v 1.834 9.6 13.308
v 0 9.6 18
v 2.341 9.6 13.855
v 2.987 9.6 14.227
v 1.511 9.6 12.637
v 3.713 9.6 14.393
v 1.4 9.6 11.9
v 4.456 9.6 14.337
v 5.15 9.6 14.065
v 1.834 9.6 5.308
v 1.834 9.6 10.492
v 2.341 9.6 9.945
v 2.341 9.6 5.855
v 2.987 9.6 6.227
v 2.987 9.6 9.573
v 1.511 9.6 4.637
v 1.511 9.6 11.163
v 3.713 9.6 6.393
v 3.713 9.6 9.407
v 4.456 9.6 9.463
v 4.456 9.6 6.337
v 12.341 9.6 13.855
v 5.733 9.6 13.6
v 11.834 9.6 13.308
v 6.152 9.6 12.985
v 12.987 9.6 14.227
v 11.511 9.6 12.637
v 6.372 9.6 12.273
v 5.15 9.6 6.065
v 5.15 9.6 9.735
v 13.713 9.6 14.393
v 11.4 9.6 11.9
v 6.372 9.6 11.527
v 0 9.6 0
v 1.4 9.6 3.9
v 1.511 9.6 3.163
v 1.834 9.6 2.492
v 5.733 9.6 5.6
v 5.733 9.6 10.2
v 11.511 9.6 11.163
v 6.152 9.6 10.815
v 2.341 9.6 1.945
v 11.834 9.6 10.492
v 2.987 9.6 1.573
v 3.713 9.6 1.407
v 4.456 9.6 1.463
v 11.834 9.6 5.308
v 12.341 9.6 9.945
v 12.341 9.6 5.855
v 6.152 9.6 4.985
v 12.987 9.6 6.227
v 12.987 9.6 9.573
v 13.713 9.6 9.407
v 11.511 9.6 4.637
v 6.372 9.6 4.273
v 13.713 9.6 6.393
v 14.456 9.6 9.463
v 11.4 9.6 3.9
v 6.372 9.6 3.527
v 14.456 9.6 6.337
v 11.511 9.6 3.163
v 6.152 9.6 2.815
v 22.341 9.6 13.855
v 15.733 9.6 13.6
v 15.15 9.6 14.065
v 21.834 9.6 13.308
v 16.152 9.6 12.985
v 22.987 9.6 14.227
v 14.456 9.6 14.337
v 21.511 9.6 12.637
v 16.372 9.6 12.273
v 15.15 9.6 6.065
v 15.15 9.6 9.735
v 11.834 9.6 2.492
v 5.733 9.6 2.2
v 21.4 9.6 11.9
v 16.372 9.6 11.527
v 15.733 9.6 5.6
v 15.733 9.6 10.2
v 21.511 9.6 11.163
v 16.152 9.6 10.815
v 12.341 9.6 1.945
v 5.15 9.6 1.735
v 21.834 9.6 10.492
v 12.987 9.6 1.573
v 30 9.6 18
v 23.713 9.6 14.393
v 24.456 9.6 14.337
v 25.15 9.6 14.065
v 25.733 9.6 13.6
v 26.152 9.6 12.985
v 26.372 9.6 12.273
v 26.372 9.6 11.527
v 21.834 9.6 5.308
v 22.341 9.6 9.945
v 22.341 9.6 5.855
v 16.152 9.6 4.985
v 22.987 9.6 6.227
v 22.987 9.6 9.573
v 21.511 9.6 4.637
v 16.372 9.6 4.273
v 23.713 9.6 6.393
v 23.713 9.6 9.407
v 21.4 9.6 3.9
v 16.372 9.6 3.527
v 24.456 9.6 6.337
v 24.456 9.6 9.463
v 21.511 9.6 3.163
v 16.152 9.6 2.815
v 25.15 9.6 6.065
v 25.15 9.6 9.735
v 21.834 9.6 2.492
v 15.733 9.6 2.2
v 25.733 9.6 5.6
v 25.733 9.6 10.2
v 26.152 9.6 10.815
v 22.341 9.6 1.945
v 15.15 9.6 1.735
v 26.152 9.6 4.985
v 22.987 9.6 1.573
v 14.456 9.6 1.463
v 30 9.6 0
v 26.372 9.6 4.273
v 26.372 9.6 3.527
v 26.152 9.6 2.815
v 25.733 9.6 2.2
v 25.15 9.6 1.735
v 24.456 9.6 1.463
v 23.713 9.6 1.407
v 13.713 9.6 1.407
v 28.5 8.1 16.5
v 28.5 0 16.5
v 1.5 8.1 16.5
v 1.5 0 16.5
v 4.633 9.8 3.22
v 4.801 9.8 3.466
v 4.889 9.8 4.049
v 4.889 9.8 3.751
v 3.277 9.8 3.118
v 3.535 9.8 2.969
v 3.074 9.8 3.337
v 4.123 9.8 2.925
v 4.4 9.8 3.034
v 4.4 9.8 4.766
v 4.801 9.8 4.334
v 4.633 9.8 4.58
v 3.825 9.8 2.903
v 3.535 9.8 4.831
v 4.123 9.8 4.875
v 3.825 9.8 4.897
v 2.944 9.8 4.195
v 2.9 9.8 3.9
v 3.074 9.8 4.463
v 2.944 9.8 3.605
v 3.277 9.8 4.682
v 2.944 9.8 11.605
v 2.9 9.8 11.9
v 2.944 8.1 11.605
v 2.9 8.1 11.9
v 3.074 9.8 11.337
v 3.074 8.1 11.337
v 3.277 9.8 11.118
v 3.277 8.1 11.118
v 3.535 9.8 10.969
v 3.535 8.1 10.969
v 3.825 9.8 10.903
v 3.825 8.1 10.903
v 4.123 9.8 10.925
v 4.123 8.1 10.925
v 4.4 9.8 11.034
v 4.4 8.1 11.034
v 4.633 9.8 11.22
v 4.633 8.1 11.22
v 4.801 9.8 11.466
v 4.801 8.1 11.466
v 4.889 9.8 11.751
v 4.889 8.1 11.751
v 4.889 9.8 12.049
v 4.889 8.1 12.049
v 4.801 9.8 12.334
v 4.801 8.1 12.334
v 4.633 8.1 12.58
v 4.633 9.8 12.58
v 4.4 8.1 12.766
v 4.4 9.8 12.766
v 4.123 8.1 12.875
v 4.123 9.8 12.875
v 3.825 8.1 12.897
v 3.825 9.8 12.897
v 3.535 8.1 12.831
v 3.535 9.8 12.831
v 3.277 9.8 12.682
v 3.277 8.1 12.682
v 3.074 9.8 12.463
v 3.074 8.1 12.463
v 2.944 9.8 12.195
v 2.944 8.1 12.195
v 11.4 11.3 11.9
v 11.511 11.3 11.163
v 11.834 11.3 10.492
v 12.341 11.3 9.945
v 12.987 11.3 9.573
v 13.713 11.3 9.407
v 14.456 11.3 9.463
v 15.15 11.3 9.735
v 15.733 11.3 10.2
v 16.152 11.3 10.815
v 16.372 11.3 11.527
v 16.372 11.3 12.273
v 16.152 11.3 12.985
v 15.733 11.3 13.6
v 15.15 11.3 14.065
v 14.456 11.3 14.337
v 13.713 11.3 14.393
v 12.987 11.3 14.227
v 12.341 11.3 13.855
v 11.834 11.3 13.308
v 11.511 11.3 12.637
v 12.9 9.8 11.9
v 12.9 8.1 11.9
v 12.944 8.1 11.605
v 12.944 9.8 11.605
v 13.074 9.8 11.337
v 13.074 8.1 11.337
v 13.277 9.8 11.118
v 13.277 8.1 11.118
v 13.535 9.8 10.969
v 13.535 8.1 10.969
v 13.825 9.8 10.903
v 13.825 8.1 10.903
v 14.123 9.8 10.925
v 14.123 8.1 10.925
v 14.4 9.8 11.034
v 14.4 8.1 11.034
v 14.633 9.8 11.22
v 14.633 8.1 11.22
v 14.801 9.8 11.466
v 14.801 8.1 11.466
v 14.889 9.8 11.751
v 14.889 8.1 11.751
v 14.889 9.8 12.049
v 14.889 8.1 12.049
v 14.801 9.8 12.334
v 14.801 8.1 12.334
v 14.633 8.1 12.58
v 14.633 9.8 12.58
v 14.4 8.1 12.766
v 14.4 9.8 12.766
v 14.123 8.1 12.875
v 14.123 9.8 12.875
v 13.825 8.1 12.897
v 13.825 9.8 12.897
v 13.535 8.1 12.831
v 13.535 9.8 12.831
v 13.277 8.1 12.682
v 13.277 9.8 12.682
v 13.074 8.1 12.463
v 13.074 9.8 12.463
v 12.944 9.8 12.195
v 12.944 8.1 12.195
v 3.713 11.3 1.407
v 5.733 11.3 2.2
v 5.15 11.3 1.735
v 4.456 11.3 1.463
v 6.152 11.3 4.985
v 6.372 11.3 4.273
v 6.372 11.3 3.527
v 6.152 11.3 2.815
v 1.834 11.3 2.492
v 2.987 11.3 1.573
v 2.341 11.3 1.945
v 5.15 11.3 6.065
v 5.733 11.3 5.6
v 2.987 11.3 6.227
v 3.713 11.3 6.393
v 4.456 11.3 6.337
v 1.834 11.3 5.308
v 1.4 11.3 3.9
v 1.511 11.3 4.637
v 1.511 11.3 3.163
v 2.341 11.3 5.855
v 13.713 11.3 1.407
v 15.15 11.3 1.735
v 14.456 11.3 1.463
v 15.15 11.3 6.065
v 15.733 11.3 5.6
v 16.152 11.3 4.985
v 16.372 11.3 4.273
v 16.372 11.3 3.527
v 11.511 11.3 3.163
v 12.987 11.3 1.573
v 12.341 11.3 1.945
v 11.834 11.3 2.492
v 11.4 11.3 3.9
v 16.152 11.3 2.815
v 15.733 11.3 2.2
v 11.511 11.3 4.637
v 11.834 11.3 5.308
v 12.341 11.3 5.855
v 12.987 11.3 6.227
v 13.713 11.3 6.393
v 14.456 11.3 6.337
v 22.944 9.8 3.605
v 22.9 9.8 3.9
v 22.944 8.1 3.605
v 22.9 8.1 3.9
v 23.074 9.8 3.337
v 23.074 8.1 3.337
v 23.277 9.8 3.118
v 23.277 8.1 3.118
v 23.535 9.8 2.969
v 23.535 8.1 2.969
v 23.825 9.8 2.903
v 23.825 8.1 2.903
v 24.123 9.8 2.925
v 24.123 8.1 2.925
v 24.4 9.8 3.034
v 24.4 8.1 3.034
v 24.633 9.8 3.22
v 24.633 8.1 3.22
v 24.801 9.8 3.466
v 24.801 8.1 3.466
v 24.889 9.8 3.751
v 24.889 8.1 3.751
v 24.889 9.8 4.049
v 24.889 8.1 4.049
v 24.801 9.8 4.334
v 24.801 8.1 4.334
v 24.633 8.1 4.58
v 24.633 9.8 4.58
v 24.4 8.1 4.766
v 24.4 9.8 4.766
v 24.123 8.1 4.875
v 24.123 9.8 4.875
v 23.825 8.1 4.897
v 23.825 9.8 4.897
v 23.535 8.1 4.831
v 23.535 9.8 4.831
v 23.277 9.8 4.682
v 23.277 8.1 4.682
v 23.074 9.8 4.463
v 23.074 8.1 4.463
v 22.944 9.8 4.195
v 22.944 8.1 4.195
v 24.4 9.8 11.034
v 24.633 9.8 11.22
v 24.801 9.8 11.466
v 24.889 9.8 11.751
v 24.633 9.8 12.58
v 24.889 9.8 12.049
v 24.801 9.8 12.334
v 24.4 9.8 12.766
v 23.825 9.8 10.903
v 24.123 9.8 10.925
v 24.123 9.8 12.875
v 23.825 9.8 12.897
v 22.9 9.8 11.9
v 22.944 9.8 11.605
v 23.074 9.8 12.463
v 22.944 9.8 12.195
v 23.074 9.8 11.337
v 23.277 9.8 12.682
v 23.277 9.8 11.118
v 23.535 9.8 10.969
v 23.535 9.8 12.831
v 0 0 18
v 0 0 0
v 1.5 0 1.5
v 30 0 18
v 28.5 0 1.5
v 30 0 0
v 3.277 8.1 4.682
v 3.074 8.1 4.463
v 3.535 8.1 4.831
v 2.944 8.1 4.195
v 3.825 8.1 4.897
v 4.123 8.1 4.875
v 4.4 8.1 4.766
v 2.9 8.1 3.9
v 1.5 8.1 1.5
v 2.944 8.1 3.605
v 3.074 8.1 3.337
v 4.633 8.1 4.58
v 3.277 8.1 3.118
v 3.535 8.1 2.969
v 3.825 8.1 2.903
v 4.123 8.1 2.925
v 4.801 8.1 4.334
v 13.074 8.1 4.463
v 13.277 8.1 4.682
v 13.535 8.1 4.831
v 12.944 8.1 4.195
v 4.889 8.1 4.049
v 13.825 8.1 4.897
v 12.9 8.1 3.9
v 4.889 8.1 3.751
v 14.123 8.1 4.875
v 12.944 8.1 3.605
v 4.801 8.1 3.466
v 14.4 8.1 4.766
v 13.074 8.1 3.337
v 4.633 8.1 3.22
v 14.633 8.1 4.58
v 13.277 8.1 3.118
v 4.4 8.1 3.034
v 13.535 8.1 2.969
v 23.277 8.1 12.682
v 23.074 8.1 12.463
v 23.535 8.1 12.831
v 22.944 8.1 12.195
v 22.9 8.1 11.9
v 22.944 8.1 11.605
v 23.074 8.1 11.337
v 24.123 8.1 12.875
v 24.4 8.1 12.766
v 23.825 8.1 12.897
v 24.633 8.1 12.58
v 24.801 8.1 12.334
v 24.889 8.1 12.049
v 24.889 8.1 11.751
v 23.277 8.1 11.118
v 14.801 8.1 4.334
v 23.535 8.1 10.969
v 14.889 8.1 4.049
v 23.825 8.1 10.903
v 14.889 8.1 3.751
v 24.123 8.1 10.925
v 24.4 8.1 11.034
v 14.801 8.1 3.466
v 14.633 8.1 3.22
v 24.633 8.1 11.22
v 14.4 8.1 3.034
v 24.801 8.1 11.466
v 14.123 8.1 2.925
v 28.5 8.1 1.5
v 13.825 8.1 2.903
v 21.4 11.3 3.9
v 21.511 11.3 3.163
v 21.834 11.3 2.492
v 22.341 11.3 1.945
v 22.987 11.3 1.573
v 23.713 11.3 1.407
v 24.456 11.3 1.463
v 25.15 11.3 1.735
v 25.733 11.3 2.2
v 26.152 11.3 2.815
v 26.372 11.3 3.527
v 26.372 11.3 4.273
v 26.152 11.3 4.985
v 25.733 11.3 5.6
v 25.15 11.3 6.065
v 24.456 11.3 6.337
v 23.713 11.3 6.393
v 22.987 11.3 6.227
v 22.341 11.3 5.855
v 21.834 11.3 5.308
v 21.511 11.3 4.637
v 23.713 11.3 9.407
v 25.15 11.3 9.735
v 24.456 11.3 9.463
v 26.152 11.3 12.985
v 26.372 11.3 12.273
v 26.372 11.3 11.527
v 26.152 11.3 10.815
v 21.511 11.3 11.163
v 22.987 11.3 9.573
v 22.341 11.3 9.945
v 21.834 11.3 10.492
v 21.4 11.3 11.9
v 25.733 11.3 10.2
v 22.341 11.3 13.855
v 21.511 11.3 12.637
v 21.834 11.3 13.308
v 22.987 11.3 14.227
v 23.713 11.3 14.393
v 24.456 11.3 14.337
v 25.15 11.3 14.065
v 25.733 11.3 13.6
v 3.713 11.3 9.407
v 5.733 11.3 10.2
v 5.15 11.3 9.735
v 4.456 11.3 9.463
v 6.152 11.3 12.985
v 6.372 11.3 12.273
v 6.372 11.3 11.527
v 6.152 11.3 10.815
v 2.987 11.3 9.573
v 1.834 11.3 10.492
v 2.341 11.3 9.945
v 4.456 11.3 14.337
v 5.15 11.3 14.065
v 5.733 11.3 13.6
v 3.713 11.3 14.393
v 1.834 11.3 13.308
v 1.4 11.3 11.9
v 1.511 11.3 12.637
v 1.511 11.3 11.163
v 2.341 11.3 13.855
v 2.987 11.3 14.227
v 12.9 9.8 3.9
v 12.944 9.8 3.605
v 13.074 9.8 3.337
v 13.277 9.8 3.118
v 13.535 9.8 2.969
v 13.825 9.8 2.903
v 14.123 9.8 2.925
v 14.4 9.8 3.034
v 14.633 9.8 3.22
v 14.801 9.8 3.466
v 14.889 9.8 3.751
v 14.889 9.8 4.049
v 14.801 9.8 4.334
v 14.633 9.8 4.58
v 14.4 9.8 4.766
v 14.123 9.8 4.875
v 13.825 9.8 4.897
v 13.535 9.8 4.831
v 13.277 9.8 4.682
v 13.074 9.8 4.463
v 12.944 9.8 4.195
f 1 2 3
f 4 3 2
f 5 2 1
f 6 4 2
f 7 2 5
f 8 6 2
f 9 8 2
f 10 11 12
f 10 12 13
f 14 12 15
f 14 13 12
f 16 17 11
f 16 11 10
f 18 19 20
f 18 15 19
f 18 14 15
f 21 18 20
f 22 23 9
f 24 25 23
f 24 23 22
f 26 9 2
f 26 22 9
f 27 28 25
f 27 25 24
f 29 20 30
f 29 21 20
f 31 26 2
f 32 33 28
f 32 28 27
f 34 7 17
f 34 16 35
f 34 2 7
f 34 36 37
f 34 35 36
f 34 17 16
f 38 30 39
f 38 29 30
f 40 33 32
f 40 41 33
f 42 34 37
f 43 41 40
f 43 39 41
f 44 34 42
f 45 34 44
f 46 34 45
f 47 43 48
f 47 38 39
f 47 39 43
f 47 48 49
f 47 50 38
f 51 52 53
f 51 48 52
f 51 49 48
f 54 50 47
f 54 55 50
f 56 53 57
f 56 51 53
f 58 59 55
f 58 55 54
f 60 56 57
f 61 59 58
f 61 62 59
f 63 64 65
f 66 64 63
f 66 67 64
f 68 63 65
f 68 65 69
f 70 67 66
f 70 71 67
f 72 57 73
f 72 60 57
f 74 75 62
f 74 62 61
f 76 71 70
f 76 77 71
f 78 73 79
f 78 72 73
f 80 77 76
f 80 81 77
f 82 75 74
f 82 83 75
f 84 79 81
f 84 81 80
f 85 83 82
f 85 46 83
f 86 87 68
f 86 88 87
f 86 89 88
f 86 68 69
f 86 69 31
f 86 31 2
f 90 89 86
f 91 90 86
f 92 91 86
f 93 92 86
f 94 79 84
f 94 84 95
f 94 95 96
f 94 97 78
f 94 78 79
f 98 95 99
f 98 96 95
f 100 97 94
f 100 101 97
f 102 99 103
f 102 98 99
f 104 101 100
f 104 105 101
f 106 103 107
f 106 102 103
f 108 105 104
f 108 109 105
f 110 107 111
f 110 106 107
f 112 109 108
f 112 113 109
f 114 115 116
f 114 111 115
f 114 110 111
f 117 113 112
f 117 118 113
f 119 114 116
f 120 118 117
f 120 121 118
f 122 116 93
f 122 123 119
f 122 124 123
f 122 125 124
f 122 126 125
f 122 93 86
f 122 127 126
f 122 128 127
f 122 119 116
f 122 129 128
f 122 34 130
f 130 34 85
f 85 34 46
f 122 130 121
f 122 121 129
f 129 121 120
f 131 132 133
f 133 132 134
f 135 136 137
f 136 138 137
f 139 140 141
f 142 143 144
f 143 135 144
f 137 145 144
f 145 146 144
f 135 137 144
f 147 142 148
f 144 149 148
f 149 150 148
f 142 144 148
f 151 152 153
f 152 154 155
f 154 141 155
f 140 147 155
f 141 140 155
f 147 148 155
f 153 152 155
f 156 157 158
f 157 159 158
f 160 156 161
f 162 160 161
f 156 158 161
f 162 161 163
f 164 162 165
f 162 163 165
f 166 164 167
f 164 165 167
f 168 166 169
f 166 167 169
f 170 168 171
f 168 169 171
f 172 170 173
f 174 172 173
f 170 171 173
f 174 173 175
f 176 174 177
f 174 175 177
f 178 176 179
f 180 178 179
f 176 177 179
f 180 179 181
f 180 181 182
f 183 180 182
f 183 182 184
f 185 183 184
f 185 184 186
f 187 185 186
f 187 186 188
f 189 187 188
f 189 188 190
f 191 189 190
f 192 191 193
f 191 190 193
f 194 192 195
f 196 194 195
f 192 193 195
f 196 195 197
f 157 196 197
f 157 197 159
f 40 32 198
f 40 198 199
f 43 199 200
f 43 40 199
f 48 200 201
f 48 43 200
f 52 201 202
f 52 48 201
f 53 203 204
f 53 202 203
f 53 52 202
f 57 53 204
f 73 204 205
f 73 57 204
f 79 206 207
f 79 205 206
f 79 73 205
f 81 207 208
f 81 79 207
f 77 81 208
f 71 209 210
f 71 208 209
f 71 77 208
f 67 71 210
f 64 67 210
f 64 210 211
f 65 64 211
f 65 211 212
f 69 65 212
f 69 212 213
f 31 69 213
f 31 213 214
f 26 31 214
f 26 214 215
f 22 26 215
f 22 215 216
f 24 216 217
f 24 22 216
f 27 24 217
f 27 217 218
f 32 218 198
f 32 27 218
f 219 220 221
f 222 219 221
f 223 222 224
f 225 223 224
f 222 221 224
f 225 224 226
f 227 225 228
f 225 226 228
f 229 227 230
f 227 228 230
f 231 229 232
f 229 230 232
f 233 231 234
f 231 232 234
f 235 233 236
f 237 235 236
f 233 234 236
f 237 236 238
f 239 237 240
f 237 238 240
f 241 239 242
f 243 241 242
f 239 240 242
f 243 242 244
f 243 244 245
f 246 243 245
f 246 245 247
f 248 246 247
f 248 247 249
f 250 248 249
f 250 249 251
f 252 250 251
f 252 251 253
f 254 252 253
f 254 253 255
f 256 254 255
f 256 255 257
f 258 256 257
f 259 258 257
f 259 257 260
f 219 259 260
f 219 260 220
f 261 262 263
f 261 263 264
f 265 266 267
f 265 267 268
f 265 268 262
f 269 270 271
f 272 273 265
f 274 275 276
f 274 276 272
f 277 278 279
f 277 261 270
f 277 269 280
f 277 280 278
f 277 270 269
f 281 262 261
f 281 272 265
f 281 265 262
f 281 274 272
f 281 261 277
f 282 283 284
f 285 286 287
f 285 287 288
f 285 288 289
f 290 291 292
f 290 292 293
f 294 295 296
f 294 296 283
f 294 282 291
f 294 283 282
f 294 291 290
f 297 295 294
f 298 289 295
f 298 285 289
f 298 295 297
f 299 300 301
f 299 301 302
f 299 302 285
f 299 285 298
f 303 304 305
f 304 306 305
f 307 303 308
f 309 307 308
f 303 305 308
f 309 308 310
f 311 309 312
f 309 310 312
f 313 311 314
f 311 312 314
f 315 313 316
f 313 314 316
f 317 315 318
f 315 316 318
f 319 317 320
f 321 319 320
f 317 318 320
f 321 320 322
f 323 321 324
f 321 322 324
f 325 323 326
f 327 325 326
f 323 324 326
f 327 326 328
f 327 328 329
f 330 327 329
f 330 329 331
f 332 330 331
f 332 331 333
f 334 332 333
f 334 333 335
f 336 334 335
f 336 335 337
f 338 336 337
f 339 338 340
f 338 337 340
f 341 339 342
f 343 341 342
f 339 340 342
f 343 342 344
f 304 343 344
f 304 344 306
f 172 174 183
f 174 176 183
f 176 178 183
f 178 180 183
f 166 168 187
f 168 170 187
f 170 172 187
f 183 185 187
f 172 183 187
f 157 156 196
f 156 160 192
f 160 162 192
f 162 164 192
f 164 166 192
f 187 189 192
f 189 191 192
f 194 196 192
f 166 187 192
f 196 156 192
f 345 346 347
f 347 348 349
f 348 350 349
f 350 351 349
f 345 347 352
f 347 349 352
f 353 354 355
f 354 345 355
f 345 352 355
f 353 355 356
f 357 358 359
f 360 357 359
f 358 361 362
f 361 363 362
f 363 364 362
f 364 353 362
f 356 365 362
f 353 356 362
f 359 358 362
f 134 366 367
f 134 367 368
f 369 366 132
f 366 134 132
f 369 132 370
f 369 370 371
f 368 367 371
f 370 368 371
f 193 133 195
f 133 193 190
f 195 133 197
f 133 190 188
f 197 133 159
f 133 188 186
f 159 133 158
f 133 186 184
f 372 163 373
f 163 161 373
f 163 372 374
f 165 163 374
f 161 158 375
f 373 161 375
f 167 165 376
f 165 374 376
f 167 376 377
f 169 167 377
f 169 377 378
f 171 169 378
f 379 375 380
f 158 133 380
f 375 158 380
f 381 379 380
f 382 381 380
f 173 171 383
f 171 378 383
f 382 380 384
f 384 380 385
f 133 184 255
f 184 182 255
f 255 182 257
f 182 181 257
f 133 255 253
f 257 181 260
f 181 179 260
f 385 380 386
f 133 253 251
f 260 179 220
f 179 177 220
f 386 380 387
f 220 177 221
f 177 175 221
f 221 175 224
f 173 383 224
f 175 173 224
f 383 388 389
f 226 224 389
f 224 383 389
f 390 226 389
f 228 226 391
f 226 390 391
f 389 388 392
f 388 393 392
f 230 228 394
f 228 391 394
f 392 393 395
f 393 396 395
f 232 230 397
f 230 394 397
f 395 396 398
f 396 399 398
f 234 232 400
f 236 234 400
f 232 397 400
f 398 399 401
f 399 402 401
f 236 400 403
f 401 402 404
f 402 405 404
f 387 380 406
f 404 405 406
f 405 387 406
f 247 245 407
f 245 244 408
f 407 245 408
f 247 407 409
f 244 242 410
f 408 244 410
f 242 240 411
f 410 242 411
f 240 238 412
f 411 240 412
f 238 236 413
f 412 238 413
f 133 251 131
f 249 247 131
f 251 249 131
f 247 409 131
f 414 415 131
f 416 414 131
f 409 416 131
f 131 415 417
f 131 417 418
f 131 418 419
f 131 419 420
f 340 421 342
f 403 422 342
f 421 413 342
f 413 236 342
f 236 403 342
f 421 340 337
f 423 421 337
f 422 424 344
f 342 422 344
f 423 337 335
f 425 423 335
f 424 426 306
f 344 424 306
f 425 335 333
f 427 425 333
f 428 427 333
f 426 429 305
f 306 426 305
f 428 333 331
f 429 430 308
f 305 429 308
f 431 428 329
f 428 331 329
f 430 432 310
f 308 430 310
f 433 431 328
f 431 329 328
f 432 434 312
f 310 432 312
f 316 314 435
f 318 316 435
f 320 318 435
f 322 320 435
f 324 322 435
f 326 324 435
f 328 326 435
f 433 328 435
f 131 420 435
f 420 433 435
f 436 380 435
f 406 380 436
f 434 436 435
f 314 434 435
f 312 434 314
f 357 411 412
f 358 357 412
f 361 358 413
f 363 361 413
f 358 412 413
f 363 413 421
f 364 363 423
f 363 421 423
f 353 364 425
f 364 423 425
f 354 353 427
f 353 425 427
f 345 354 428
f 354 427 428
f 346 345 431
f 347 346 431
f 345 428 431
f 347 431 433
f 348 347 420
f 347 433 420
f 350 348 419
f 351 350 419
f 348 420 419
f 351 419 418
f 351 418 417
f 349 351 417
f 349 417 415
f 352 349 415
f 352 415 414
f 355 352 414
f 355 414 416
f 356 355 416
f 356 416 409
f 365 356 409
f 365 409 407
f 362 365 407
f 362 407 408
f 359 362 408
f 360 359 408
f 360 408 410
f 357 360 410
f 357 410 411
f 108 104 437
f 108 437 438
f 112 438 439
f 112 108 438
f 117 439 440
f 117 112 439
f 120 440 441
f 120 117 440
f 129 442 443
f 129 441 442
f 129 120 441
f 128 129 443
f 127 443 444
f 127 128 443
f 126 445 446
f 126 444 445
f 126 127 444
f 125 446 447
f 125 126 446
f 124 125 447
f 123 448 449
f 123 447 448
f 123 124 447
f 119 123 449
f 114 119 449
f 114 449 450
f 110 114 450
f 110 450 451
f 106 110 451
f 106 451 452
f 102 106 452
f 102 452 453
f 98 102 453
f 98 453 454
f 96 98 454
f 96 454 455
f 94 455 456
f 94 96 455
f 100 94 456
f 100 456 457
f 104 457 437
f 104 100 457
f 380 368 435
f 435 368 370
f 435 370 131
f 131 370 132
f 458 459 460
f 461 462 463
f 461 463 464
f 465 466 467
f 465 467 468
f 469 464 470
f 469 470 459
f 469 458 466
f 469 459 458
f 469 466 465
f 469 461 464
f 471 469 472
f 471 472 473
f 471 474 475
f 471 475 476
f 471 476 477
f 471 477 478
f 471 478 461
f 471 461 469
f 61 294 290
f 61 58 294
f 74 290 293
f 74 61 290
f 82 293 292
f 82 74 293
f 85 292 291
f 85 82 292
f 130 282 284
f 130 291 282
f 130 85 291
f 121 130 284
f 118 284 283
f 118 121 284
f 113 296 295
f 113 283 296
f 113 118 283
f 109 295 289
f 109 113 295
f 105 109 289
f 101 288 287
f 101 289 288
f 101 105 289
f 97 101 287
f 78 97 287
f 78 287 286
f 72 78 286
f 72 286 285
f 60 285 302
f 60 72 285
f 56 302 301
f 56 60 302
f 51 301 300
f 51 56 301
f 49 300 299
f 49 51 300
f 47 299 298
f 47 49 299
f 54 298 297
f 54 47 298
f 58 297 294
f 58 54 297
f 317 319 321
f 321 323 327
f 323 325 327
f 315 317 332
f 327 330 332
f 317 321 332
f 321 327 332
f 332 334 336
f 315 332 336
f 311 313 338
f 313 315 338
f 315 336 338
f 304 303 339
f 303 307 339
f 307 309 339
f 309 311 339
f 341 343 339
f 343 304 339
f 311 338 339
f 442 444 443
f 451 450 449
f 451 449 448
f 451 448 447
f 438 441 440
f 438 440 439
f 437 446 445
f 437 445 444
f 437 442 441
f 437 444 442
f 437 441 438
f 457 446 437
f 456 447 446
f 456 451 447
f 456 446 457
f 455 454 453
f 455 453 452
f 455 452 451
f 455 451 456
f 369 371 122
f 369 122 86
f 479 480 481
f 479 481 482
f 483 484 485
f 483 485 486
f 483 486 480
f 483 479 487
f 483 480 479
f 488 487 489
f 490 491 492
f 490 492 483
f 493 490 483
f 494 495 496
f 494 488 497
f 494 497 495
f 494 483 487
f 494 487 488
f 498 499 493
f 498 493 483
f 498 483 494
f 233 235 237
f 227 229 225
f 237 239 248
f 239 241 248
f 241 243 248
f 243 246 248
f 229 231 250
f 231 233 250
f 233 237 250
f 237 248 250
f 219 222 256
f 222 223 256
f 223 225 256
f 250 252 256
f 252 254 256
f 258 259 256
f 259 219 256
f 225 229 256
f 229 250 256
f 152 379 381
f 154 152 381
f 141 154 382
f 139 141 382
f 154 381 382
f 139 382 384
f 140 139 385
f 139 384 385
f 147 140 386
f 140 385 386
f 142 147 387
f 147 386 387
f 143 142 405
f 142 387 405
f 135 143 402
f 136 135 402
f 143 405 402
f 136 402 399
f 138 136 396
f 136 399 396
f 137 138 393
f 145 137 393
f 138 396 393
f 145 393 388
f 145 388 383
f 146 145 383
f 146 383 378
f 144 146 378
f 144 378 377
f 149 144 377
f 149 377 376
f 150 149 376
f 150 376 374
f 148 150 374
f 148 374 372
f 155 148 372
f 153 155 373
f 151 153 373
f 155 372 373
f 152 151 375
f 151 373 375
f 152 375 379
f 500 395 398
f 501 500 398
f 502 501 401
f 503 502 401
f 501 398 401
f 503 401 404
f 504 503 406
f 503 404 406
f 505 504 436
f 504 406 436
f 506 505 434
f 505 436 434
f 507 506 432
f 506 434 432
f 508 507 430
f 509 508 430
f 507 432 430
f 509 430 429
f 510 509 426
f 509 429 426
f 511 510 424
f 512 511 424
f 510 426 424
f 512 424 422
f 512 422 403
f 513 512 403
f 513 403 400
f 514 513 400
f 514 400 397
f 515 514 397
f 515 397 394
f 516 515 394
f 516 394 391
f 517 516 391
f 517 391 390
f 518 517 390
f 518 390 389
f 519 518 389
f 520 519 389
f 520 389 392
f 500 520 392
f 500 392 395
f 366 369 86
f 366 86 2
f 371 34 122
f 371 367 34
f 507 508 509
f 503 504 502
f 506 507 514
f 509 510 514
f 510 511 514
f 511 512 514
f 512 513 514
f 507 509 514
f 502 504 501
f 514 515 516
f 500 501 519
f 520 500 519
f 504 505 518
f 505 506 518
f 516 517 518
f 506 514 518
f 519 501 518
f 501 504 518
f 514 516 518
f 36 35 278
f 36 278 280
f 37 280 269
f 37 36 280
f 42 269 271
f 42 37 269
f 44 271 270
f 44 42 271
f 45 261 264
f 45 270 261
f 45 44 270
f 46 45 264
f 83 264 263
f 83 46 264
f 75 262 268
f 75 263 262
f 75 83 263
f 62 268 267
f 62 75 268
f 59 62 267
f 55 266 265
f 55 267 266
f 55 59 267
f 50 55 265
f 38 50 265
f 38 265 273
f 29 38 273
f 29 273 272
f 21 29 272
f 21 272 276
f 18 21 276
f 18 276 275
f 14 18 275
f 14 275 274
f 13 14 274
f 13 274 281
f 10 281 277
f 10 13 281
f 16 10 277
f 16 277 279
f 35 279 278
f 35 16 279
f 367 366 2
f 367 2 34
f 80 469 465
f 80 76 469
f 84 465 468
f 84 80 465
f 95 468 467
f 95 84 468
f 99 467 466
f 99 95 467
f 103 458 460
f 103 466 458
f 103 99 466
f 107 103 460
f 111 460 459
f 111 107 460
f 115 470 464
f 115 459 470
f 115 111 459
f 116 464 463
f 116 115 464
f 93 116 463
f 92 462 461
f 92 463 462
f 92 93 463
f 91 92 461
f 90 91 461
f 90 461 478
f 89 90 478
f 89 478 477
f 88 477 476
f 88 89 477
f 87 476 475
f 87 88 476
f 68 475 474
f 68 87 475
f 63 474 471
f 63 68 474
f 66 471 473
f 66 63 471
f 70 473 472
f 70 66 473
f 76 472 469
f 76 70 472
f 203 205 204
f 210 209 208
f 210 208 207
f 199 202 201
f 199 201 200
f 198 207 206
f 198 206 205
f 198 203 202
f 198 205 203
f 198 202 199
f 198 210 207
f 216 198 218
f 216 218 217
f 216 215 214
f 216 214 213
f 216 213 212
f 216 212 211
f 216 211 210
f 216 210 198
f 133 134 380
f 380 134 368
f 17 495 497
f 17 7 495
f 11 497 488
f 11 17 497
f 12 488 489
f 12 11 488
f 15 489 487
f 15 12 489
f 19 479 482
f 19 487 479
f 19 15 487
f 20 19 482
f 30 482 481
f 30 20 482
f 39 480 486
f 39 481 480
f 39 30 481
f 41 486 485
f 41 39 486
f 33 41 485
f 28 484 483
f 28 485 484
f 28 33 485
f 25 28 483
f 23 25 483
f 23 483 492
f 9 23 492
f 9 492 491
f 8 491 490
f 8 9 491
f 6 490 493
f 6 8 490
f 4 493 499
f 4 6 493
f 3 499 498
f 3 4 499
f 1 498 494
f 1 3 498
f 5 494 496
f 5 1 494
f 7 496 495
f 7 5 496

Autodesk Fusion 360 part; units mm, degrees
sketch "Sketch1" plane through (0, 0, 0) normal (0, 1, 0) x (1, 0, 0)
  line L0 (0, 0) -> (30, 0)
  line L1 (30, 0) -> (30, -18)
  line L2 (30, -18) -> (0, -18)
  line L3 (0, -18) -> (0, 0)
  dimension "d1" = 30
  dimension "d2" = 18
extrude "Extrude1" add sketch "Sketch1" along normal blind 9.6
sketch "Sketch2" plane through (0, 9.6, 0) normal (0, 1, 0) x (-1, 0, 0)
  line L0 (0, 18) -> (-30, 18)
  line L1 (-30, 18) -> (-30, 0)
  line L2 (-30, 0) -> (0, 0)
  line L3 (0, 0) -> (0, 18)
  circle A0 centre (-3.9, 3.9) radius 2.5
  dimension "d5" = 5
  dimension "d6" = 3.9
  dimension "d7" = 3.9
extrude "Extrude2" add sketch "Sketch2" along normal blind 1.7 contours A0
pattern_linear "R-Pattern1" count 3 spacing 10 along (1, 0, 0) count 2 spacing 8 along (0, 0, 1) of "Extrude2"
shell "Shell1" thickness 1.5 removed faces 1 at (10, 0, 6)
